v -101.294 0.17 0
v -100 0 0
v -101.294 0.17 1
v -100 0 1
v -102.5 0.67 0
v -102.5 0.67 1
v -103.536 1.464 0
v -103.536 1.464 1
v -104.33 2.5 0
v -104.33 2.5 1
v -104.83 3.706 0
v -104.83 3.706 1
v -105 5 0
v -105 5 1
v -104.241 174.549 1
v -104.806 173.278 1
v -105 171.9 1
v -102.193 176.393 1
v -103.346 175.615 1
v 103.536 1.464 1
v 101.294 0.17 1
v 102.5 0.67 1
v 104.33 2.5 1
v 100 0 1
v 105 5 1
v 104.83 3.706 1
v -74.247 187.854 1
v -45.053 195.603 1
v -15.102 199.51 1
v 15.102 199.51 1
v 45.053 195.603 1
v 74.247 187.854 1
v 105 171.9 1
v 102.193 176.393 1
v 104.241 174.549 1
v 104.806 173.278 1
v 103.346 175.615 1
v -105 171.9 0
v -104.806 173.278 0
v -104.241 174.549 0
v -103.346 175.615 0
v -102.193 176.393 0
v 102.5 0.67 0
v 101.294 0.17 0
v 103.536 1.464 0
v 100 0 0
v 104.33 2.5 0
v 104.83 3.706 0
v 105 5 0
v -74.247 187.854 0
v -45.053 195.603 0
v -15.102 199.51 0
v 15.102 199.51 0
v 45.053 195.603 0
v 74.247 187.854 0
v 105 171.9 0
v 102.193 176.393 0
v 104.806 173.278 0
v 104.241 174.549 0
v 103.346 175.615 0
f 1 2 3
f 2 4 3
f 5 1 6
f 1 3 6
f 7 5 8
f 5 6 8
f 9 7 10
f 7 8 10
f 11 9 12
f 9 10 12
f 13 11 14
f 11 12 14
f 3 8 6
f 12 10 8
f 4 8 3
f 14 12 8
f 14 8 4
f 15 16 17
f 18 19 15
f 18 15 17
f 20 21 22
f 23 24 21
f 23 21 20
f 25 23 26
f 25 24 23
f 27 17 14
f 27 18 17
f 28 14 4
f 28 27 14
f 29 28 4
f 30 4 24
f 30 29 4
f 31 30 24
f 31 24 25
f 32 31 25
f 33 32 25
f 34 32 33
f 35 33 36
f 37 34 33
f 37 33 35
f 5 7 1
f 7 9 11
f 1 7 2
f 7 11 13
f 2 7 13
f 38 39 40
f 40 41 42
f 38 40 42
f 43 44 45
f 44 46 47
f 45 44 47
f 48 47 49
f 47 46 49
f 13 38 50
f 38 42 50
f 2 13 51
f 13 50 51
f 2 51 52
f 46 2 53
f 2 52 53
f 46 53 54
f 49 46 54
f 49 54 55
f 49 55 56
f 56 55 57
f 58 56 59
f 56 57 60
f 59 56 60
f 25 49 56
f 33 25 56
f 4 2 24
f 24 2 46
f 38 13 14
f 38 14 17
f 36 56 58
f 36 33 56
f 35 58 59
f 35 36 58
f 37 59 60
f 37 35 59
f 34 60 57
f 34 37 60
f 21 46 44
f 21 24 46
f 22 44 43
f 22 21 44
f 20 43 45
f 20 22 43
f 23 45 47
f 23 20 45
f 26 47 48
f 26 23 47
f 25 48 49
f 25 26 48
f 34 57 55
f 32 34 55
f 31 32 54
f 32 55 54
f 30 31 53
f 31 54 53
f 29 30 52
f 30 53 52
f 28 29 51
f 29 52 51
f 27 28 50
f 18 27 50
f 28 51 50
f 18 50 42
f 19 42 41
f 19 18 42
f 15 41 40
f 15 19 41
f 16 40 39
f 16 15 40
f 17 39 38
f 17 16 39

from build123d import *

# Parameters (mm, degrees)
PAD_DEPTH = 1
FILLET_R  = 5


with BuildPart() as part:
    # Sketch → Pad (new body)
    with BuildSketch(Plane.XY):
        with BuildLine():
            Line((-105, 0), (105, 0))
            Line((105, 0), (105, 175))
            ThreePointArc((105, 175), (0, 200), (-105, 175))
            Line((-105, 0), (-105, 175))
        make_face()
    extrude(amount=PAD_DEPTH)

    # Fillet
    fillet_edges = [part.edges().sort_by_distance(p)[0] for p in [
        (105, 0, 0.5),
        (105, 175, 0.5),
        (-105, 175, 0.5),
        (-105, 0, 0.5),
    ]]
    fillet(fillet_edges, radius=FILLET_R)


solid = part.part
